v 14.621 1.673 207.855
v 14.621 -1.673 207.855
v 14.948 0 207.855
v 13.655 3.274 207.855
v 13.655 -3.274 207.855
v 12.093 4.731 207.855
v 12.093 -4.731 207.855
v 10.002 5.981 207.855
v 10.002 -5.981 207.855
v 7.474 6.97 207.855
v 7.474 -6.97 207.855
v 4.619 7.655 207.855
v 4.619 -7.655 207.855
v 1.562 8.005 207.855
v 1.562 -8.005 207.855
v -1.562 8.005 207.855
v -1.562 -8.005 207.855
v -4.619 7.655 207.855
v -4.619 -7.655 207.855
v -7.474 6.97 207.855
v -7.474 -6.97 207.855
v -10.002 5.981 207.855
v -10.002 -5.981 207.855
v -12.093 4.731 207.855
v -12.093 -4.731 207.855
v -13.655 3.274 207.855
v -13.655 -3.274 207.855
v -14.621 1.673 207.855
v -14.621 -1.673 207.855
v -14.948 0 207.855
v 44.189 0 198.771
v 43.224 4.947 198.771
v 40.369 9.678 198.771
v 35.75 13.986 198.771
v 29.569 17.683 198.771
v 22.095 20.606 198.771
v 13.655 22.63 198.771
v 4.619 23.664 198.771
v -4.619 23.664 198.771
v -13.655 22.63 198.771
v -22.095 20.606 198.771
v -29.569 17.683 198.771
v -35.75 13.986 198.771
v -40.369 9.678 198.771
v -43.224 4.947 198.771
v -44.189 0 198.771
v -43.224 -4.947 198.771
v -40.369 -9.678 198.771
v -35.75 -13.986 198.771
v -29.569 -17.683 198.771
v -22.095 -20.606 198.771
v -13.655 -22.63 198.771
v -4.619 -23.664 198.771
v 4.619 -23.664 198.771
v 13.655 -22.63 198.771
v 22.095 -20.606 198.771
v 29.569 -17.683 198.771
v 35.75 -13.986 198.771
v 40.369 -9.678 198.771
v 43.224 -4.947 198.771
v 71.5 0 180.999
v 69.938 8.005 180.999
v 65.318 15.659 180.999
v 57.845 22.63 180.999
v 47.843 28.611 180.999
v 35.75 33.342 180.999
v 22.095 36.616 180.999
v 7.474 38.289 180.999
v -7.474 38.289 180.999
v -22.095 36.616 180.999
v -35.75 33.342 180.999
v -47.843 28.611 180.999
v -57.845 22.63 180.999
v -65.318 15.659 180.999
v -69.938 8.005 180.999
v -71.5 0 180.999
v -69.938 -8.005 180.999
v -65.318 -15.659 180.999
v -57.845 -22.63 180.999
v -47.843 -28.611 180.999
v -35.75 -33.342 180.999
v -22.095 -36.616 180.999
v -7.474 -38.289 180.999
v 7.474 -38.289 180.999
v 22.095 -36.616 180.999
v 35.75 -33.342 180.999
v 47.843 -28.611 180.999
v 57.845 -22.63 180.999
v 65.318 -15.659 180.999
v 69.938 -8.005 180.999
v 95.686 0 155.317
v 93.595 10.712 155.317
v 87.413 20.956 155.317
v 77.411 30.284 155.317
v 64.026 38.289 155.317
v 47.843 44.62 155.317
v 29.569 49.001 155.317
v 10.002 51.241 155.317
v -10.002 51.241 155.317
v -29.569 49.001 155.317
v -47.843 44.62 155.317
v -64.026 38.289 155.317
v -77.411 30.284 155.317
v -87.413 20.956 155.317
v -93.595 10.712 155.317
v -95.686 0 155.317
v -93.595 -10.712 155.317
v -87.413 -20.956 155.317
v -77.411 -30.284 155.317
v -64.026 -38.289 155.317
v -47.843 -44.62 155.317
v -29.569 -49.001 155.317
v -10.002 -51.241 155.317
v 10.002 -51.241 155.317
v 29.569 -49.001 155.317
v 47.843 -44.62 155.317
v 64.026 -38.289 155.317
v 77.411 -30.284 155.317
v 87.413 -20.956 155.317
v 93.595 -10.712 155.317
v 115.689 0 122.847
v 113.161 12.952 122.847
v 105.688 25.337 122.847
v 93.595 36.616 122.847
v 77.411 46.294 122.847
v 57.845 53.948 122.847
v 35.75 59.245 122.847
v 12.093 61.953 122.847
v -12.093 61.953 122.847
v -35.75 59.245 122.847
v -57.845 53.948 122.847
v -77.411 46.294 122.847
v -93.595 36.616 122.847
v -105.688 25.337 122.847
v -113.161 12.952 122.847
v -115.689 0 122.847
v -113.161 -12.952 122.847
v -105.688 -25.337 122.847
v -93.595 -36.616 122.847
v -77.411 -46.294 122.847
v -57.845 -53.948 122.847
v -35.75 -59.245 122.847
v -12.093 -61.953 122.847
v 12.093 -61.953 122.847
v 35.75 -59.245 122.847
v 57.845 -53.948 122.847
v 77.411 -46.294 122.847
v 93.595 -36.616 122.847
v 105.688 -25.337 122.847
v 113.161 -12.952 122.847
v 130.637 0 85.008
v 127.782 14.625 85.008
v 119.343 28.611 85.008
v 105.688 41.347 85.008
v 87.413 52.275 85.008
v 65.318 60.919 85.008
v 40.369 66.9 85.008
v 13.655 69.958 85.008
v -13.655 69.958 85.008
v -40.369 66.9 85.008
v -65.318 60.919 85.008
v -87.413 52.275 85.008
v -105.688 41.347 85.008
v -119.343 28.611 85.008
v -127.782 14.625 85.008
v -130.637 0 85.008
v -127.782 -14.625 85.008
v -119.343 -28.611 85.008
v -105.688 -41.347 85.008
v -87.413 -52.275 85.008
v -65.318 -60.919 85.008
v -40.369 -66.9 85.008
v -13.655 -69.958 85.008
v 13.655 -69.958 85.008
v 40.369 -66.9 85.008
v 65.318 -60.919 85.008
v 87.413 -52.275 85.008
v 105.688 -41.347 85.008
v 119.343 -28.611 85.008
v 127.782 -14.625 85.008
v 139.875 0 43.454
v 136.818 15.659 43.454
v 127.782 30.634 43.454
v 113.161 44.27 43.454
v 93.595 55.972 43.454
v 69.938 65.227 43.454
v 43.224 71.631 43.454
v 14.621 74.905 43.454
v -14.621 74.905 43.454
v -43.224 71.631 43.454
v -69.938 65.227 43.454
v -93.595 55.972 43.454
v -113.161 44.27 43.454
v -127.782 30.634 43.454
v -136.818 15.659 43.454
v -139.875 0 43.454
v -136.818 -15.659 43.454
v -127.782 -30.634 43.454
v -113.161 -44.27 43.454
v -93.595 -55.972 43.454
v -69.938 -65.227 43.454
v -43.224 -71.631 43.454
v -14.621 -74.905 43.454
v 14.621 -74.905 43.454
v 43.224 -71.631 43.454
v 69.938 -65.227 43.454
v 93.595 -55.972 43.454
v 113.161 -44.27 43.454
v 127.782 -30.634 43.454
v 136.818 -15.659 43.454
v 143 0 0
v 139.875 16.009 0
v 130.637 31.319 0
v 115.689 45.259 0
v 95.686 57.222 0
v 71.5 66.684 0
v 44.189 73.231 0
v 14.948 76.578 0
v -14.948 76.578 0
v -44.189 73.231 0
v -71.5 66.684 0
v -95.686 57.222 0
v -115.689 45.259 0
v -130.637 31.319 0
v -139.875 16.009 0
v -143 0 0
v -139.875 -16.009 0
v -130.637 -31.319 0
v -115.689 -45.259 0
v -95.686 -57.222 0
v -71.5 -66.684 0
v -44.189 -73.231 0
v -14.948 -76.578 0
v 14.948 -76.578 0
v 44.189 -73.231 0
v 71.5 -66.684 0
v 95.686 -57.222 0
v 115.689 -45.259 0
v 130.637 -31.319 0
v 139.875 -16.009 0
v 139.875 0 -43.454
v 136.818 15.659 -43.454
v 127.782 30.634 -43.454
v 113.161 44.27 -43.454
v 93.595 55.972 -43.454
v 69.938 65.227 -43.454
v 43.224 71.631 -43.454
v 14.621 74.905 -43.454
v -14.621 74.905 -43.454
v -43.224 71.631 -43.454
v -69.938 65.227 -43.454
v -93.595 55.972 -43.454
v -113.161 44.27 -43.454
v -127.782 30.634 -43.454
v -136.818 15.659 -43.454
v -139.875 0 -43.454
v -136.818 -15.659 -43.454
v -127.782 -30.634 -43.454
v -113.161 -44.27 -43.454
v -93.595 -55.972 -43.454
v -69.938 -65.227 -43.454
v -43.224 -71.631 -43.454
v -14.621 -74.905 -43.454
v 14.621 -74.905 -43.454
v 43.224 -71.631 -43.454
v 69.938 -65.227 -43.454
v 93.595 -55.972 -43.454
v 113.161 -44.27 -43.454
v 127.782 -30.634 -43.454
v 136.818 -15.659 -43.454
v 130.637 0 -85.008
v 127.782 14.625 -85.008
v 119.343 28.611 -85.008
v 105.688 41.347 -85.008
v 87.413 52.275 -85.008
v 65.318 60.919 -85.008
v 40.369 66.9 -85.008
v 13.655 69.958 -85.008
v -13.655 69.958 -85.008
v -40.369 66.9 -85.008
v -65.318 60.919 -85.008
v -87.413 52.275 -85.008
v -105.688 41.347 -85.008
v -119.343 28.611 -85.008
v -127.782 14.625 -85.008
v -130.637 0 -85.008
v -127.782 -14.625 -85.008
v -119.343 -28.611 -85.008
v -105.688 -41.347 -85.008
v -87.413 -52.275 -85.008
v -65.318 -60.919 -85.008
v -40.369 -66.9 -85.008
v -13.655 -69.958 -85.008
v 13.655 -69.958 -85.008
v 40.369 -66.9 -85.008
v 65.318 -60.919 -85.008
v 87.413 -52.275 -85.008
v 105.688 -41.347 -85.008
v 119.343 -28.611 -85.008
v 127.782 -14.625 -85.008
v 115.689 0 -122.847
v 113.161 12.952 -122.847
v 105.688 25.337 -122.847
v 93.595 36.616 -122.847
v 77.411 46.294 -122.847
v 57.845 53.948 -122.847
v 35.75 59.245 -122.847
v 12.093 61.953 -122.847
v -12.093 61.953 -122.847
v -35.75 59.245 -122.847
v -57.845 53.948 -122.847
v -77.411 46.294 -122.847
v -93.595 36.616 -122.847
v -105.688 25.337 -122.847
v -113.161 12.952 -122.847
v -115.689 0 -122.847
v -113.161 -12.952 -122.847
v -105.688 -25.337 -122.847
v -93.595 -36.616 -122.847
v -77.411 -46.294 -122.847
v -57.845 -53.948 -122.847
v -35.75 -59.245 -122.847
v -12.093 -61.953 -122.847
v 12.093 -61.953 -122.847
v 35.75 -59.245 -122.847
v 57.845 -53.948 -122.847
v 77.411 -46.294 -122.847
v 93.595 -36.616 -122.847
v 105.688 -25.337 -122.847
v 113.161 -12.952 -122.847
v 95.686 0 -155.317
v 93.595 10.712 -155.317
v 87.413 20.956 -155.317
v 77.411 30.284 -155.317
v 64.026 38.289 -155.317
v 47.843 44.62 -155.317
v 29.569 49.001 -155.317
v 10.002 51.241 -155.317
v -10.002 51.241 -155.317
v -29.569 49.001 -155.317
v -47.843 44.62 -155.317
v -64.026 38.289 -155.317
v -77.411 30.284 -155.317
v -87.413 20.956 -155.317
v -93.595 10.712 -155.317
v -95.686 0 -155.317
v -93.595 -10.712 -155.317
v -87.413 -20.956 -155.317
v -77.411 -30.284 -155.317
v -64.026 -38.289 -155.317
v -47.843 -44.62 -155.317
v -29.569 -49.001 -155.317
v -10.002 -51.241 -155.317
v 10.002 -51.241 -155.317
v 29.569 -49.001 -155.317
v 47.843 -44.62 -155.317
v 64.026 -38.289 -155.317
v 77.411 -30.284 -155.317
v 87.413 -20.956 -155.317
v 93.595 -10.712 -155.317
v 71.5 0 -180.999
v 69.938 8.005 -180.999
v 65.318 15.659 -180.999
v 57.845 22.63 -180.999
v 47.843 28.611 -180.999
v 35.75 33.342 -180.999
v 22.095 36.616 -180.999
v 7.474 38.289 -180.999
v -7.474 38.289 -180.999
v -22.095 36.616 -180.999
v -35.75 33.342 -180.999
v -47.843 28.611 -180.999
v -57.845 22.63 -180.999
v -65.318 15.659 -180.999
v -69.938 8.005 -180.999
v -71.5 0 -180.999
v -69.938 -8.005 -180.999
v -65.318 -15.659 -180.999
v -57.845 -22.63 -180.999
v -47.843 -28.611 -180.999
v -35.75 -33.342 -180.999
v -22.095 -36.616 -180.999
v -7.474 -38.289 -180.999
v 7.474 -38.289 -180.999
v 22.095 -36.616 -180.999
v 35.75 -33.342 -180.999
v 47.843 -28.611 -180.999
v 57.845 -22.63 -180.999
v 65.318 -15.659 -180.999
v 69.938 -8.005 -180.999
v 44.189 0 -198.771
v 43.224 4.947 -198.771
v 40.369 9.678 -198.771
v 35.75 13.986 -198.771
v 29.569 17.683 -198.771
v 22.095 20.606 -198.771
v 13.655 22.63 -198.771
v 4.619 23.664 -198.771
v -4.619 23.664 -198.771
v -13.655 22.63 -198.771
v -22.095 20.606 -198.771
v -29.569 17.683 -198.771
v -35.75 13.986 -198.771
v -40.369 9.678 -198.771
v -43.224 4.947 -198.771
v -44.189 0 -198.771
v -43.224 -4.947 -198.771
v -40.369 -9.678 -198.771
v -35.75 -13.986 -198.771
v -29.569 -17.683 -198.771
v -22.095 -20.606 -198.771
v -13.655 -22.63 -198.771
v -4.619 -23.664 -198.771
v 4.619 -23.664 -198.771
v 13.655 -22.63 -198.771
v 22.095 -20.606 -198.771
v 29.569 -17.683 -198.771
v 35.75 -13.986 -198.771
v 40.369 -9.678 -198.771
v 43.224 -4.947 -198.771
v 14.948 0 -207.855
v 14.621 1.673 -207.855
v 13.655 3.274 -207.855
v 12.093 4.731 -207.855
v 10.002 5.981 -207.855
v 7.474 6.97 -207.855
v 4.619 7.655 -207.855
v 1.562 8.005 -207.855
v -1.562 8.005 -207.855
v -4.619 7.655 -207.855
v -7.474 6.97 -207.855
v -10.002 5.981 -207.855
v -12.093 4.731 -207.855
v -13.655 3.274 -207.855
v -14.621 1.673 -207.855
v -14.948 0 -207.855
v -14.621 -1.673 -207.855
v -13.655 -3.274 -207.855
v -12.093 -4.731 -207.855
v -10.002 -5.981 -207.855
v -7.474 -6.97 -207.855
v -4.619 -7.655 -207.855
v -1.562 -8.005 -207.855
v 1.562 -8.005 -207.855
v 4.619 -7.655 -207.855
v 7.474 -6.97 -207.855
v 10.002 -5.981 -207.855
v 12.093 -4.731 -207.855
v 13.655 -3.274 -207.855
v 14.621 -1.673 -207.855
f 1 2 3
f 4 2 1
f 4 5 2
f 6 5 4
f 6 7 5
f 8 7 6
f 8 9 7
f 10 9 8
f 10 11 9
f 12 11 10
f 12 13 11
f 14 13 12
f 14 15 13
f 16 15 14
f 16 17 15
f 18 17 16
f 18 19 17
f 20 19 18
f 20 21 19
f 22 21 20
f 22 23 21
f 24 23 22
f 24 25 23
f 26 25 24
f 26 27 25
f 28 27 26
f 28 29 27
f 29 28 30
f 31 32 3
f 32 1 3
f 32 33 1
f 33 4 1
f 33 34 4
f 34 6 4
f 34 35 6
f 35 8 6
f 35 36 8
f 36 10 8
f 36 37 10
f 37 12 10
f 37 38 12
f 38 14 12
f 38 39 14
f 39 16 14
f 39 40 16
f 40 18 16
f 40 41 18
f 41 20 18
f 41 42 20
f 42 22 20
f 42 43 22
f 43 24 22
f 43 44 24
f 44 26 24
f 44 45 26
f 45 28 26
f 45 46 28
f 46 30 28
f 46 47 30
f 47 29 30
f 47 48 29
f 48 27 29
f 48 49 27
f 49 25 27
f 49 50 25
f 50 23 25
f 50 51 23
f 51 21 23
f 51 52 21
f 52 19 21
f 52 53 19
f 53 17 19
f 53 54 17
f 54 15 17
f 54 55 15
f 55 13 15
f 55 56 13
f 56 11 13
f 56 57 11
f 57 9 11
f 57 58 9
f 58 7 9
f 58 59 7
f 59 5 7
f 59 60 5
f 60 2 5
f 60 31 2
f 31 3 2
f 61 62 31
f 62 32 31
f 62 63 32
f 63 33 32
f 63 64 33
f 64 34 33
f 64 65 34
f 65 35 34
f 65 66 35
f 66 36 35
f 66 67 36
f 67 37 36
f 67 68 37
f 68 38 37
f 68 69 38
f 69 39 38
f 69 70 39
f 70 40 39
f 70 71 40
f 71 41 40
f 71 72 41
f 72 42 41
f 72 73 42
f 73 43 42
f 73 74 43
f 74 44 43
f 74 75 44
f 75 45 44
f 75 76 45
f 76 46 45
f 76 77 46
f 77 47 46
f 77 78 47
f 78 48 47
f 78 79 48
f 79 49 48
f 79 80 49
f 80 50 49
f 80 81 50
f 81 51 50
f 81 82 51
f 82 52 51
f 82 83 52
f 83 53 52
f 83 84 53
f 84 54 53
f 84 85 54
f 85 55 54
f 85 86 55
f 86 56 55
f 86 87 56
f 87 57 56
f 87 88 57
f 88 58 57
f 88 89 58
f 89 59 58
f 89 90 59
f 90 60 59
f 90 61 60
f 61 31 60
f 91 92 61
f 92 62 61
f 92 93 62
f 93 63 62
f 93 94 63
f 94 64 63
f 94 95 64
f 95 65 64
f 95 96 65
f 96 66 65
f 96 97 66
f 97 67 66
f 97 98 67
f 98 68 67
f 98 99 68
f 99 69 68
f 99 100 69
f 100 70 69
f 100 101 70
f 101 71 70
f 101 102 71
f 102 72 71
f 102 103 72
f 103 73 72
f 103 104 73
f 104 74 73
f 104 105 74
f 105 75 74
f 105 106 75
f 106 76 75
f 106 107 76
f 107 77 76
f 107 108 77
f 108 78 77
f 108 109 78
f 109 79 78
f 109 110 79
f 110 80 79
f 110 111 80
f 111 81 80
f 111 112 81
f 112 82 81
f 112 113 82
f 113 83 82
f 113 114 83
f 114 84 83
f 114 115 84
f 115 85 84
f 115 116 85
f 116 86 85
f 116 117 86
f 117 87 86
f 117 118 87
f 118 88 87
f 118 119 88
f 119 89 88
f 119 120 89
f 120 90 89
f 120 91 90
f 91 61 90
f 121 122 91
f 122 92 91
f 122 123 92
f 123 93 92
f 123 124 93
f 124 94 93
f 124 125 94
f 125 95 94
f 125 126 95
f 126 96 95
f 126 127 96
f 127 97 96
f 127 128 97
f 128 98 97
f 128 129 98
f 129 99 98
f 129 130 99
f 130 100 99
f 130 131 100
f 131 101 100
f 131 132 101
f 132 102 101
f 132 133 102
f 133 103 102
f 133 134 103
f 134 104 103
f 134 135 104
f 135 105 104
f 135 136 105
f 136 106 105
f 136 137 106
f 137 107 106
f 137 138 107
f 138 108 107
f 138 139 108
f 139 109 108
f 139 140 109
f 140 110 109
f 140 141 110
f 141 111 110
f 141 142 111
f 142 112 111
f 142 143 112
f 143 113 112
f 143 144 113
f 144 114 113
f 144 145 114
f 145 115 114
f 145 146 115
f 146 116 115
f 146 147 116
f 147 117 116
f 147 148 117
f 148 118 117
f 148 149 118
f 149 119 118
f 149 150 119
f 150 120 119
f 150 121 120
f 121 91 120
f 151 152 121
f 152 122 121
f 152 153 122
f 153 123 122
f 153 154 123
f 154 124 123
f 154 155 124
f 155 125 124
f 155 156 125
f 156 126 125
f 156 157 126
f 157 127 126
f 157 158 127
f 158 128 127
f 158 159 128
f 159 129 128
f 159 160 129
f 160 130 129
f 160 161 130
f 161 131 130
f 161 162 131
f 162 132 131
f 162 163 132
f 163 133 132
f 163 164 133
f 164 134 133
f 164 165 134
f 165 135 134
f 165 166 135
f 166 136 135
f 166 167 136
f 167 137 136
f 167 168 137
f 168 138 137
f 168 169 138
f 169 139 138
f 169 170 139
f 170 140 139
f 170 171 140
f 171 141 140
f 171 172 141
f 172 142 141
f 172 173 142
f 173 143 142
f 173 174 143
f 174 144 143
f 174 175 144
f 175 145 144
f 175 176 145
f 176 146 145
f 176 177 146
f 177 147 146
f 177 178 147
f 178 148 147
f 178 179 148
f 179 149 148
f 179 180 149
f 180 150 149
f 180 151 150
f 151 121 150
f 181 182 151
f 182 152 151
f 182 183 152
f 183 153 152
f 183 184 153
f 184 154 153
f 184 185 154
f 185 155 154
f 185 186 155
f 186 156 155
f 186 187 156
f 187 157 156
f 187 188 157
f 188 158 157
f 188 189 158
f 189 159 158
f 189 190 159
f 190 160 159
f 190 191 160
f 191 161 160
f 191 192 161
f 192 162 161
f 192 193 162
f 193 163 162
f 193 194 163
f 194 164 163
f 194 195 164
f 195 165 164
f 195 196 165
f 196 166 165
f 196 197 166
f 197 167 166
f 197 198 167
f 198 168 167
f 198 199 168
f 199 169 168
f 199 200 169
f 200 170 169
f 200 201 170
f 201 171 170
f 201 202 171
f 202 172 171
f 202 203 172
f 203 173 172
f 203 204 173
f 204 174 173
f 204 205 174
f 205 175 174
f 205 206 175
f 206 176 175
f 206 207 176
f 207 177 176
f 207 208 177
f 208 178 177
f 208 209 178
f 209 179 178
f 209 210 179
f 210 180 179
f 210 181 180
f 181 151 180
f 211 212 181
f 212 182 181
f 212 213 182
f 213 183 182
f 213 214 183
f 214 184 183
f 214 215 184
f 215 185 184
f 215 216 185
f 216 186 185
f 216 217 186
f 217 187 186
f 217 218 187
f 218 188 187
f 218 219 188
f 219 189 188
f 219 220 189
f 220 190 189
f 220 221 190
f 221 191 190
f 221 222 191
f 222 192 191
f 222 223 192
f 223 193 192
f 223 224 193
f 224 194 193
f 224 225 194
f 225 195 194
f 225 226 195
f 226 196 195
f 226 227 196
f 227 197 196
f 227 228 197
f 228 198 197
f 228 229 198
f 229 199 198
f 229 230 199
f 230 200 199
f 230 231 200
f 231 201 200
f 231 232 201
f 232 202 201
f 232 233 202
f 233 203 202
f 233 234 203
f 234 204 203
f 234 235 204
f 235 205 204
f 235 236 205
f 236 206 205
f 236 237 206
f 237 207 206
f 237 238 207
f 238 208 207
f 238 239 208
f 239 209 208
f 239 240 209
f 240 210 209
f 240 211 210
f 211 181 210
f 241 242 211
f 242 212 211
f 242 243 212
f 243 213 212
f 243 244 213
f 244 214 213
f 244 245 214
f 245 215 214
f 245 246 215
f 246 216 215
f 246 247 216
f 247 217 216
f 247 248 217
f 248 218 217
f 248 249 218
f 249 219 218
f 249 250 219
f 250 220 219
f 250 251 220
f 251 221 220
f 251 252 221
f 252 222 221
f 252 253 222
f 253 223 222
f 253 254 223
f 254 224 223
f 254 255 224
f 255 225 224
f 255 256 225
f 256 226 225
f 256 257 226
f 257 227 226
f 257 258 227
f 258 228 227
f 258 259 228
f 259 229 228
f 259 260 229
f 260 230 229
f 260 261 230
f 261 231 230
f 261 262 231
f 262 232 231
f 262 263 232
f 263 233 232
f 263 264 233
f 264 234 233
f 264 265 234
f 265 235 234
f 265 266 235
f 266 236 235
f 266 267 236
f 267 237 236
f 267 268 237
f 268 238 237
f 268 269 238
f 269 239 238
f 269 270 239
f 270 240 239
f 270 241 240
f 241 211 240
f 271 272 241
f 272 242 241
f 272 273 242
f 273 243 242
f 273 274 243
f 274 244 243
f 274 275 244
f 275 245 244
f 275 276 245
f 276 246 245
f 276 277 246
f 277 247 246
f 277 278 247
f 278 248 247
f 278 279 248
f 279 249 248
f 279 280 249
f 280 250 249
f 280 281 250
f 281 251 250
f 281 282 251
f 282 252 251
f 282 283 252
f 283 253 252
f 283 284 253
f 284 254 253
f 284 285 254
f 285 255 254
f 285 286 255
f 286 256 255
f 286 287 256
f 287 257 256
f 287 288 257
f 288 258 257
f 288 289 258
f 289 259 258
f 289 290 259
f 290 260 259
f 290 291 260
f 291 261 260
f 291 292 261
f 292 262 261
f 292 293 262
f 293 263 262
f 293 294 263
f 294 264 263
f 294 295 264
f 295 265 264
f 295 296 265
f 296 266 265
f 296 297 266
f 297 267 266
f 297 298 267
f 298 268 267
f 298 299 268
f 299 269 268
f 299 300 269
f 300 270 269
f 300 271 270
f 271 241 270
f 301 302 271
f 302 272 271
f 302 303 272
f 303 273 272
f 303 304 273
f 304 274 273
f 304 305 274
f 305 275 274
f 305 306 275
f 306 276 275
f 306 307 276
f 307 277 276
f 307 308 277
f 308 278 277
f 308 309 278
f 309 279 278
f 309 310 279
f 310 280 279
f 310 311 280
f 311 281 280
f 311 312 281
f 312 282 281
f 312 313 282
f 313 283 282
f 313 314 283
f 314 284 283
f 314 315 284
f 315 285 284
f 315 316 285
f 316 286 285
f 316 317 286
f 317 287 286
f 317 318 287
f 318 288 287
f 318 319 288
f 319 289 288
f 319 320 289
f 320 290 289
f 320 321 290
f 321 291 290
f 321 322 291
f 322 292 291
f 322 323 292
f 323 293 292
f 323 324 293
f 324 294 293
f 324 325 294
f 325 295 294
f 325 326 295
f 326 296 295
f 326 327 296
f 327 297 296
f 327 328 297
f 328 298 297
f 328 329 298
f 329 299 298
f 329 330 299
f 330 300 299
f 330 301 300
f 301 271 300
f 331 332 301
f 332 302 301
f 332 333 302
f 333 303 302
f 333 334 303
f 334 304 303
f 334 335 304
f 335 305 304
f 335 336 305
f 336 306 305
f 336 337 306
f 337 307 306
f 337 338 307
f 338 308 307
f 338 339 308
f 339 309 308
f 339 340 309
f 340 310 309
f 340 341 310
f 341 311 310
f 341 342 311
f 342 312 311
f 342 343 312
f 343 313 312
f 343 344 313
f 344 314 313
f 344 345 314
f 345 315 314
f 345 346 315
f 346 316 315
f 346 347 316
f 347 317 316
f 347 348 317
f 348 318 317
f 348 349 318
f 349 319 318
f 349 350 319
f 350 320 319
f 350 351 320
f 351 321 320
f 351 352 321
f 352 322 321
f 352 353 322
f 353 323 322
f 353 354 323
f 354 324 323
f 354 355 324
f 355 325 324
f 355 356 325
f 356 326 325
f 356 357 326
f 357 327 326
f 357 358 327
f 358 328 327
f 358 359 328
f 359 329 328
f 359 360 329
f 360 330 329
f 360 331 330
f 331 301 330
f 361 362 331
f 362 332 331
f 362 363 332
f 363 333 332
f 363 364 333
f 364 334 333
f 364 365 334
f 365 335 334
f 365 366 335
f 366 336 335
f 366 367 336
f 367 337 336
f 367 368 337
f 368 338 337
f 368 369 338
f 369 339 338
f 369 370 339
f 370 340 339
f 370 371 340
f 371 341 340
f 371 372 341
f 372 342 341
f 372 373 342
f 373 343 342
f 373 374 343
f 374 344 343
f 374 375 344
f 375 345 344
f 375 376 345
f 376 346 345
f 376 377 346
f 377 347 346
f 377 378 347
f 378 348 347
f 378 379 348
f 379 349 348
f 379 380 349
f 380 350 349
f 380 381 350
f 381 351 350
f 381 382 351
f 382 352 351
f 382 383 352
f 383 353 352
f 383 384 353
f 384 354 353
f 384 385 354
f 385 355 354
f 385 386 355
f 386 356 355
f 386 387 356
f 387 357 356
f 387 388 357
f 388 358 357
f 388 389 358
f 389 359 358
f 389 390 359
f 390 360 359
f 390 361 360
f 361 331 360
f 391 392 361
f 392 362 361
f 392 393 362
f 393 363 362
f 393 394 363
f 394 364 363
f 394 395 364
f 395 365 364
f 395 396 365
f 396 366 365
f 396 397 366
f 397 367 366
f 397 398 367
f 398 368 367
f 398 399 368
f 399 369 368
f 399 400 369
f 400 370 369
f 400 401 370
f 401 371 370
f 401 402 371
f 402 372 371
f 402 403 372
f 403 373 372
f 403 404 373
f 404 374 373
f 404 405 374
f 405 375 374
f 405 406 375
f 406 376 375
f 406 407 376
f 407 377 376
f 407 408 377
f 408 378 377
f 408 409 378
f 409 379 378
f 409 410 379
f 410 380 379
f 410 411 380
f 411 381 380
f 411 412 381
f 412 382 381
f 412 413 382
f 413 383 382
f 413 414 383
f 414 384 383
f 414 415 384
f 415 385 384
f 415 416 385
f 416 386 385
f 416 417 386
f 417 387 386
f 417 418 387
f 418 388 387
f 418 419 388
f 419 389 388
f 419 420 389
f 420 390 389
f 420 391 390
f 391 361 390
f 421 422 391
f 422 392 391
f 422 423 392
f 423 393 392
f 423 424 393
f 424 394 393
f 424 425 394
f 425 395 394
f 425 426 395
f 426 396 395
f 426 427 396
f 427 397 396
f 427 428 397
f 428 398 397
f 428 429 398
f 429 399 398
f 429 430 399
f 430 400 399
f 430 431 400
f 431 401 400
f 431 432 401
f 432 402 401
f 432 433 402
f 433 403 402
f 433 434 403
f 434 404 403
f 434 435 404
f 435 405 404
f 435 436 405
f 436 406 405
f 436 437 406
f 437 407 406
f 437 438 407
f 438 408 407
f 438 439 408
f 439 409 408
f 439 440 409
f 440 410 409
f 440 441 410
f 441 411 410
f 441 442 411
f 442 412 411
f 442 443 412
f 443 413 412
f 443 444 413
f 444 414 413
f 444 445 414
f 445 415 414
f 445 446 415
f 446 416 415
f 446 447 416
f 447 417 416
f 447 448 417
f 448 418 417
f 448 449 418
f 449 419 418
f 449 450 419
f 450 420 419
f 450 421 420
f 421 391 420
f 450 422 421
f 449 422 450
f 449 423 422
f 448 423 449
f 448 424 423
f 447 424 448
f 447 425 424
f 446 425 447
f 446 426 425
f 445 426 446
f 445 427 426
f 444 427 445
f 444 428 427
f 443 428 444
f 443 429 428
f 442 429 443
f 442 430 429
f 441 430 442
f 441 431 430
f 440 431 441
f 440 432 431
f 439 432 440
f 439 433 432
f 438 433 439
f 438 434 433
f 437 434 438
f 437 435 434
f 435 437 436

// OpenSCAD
// Generated by SolidPython 1.0.1 on 2020-07-29 00:46:50


scale(v = [13, 7, 19]) {
	sphere(r = 11);
}
/***********************************************
*********      SolidPython code:      **********
************************************************
 
# import packages: SolidPython
from solid import *
from solid.utils import *
from itertools import chain, combinations, permutations


class Resize:

    def __init__(self, scad_file):
        self.scad_file = scad_file
        #self.scad_file = import_scad(scad_file)
        # cone/cylinder param:
        self.r1 = 0
        self.r2 = 0
        self.h = 0
        # rectangular prism param:
        self.w = 0
        self.l = 0
        # ellipse param:
        self.r = 0

    # import OpenScad code (file name corresponds to shape)


    # classify shape + parameters
    def assign(self, param1, param2, param3):
        if self.scad_file == 'cone.scad':
            self.r1 = param1
            self.r2 = param2
            self.h = param3
        elif self.scad_file == 'cylinder.scad':
            self.r1 = param1
            self.r2 = param2
            self.h = param3
        elif self.scad_file == 'rectangularPrism.scad':
            self.h = param1
            self.l = param2
            self.w = param3
        else:
            self.r = param1
            self.h = param2

    # resize parameters
    def iterate(self):
        x = range(3, 20, 2)
        i = 1
        if self.scad_file == 'cone.scad':
            tempList = list(permutations(x, 2))
            for temp in tempList:
                param1 = temp[0]
                param2 = temp[1]
                filepath = 'produced_scad_files/' + 'cone' + str(param1) + '_' + str(param2) + '_' + '.scad'
                scad_render_to_file(cylinder(h=param1, r1=param2, r2=0), filepath)

        elif self.scad_file == 'cylinder.scad':
            tempList = list(permutations(x, 3))
            for temp in tempList:
                param1 = temp[0]
                param2 = temp[1]
                filepath = 'produced_scad_files/' + 'cylinder' + str(param1) + '_' + str(param2) + '_' + '.scad'
                scad_render_to_file(cylinder(h=param1, r1=param2, r2=param2), filepath)

        elif self.scad_file == 'rectangularPrism.scad':
            tempList = list(permutations(x, 3))
            for temp in tempList:
                param1 = temp[0]
                param2 = temp[1]
                param3 = temp[2]
                filepath = 'produced_scad_files/' + 'rectangularPrism' + str(param1) + '_' + str(param2) + '_' + str(
                    param3) + '.scad'
                scad_render_to_file(cube(size=(param1, param2, param3)), filepath)

        elif self.scad_file == 'ellipse.scad':
            tempList = list(permutations(x, 4))
            for temp in tempList:
                param1 = temp[0]
                param2 = temp[1]
                param3 = temp[2]
                param4 = temp[3]
                filepath = 'produced_scad_files/' + 'ellipse' + str(param1) + '_' + str(param2) + '_' + str(param3) + '_' + str(param4) + '.scad'
                scad_render_to_file(scale([param1, param2, param3])(sphere(r=param4)), filepath)

    def render_to_scadfile(self):
        scad_render_to_file(scad, 'example.scad') 
 
************************************************/
